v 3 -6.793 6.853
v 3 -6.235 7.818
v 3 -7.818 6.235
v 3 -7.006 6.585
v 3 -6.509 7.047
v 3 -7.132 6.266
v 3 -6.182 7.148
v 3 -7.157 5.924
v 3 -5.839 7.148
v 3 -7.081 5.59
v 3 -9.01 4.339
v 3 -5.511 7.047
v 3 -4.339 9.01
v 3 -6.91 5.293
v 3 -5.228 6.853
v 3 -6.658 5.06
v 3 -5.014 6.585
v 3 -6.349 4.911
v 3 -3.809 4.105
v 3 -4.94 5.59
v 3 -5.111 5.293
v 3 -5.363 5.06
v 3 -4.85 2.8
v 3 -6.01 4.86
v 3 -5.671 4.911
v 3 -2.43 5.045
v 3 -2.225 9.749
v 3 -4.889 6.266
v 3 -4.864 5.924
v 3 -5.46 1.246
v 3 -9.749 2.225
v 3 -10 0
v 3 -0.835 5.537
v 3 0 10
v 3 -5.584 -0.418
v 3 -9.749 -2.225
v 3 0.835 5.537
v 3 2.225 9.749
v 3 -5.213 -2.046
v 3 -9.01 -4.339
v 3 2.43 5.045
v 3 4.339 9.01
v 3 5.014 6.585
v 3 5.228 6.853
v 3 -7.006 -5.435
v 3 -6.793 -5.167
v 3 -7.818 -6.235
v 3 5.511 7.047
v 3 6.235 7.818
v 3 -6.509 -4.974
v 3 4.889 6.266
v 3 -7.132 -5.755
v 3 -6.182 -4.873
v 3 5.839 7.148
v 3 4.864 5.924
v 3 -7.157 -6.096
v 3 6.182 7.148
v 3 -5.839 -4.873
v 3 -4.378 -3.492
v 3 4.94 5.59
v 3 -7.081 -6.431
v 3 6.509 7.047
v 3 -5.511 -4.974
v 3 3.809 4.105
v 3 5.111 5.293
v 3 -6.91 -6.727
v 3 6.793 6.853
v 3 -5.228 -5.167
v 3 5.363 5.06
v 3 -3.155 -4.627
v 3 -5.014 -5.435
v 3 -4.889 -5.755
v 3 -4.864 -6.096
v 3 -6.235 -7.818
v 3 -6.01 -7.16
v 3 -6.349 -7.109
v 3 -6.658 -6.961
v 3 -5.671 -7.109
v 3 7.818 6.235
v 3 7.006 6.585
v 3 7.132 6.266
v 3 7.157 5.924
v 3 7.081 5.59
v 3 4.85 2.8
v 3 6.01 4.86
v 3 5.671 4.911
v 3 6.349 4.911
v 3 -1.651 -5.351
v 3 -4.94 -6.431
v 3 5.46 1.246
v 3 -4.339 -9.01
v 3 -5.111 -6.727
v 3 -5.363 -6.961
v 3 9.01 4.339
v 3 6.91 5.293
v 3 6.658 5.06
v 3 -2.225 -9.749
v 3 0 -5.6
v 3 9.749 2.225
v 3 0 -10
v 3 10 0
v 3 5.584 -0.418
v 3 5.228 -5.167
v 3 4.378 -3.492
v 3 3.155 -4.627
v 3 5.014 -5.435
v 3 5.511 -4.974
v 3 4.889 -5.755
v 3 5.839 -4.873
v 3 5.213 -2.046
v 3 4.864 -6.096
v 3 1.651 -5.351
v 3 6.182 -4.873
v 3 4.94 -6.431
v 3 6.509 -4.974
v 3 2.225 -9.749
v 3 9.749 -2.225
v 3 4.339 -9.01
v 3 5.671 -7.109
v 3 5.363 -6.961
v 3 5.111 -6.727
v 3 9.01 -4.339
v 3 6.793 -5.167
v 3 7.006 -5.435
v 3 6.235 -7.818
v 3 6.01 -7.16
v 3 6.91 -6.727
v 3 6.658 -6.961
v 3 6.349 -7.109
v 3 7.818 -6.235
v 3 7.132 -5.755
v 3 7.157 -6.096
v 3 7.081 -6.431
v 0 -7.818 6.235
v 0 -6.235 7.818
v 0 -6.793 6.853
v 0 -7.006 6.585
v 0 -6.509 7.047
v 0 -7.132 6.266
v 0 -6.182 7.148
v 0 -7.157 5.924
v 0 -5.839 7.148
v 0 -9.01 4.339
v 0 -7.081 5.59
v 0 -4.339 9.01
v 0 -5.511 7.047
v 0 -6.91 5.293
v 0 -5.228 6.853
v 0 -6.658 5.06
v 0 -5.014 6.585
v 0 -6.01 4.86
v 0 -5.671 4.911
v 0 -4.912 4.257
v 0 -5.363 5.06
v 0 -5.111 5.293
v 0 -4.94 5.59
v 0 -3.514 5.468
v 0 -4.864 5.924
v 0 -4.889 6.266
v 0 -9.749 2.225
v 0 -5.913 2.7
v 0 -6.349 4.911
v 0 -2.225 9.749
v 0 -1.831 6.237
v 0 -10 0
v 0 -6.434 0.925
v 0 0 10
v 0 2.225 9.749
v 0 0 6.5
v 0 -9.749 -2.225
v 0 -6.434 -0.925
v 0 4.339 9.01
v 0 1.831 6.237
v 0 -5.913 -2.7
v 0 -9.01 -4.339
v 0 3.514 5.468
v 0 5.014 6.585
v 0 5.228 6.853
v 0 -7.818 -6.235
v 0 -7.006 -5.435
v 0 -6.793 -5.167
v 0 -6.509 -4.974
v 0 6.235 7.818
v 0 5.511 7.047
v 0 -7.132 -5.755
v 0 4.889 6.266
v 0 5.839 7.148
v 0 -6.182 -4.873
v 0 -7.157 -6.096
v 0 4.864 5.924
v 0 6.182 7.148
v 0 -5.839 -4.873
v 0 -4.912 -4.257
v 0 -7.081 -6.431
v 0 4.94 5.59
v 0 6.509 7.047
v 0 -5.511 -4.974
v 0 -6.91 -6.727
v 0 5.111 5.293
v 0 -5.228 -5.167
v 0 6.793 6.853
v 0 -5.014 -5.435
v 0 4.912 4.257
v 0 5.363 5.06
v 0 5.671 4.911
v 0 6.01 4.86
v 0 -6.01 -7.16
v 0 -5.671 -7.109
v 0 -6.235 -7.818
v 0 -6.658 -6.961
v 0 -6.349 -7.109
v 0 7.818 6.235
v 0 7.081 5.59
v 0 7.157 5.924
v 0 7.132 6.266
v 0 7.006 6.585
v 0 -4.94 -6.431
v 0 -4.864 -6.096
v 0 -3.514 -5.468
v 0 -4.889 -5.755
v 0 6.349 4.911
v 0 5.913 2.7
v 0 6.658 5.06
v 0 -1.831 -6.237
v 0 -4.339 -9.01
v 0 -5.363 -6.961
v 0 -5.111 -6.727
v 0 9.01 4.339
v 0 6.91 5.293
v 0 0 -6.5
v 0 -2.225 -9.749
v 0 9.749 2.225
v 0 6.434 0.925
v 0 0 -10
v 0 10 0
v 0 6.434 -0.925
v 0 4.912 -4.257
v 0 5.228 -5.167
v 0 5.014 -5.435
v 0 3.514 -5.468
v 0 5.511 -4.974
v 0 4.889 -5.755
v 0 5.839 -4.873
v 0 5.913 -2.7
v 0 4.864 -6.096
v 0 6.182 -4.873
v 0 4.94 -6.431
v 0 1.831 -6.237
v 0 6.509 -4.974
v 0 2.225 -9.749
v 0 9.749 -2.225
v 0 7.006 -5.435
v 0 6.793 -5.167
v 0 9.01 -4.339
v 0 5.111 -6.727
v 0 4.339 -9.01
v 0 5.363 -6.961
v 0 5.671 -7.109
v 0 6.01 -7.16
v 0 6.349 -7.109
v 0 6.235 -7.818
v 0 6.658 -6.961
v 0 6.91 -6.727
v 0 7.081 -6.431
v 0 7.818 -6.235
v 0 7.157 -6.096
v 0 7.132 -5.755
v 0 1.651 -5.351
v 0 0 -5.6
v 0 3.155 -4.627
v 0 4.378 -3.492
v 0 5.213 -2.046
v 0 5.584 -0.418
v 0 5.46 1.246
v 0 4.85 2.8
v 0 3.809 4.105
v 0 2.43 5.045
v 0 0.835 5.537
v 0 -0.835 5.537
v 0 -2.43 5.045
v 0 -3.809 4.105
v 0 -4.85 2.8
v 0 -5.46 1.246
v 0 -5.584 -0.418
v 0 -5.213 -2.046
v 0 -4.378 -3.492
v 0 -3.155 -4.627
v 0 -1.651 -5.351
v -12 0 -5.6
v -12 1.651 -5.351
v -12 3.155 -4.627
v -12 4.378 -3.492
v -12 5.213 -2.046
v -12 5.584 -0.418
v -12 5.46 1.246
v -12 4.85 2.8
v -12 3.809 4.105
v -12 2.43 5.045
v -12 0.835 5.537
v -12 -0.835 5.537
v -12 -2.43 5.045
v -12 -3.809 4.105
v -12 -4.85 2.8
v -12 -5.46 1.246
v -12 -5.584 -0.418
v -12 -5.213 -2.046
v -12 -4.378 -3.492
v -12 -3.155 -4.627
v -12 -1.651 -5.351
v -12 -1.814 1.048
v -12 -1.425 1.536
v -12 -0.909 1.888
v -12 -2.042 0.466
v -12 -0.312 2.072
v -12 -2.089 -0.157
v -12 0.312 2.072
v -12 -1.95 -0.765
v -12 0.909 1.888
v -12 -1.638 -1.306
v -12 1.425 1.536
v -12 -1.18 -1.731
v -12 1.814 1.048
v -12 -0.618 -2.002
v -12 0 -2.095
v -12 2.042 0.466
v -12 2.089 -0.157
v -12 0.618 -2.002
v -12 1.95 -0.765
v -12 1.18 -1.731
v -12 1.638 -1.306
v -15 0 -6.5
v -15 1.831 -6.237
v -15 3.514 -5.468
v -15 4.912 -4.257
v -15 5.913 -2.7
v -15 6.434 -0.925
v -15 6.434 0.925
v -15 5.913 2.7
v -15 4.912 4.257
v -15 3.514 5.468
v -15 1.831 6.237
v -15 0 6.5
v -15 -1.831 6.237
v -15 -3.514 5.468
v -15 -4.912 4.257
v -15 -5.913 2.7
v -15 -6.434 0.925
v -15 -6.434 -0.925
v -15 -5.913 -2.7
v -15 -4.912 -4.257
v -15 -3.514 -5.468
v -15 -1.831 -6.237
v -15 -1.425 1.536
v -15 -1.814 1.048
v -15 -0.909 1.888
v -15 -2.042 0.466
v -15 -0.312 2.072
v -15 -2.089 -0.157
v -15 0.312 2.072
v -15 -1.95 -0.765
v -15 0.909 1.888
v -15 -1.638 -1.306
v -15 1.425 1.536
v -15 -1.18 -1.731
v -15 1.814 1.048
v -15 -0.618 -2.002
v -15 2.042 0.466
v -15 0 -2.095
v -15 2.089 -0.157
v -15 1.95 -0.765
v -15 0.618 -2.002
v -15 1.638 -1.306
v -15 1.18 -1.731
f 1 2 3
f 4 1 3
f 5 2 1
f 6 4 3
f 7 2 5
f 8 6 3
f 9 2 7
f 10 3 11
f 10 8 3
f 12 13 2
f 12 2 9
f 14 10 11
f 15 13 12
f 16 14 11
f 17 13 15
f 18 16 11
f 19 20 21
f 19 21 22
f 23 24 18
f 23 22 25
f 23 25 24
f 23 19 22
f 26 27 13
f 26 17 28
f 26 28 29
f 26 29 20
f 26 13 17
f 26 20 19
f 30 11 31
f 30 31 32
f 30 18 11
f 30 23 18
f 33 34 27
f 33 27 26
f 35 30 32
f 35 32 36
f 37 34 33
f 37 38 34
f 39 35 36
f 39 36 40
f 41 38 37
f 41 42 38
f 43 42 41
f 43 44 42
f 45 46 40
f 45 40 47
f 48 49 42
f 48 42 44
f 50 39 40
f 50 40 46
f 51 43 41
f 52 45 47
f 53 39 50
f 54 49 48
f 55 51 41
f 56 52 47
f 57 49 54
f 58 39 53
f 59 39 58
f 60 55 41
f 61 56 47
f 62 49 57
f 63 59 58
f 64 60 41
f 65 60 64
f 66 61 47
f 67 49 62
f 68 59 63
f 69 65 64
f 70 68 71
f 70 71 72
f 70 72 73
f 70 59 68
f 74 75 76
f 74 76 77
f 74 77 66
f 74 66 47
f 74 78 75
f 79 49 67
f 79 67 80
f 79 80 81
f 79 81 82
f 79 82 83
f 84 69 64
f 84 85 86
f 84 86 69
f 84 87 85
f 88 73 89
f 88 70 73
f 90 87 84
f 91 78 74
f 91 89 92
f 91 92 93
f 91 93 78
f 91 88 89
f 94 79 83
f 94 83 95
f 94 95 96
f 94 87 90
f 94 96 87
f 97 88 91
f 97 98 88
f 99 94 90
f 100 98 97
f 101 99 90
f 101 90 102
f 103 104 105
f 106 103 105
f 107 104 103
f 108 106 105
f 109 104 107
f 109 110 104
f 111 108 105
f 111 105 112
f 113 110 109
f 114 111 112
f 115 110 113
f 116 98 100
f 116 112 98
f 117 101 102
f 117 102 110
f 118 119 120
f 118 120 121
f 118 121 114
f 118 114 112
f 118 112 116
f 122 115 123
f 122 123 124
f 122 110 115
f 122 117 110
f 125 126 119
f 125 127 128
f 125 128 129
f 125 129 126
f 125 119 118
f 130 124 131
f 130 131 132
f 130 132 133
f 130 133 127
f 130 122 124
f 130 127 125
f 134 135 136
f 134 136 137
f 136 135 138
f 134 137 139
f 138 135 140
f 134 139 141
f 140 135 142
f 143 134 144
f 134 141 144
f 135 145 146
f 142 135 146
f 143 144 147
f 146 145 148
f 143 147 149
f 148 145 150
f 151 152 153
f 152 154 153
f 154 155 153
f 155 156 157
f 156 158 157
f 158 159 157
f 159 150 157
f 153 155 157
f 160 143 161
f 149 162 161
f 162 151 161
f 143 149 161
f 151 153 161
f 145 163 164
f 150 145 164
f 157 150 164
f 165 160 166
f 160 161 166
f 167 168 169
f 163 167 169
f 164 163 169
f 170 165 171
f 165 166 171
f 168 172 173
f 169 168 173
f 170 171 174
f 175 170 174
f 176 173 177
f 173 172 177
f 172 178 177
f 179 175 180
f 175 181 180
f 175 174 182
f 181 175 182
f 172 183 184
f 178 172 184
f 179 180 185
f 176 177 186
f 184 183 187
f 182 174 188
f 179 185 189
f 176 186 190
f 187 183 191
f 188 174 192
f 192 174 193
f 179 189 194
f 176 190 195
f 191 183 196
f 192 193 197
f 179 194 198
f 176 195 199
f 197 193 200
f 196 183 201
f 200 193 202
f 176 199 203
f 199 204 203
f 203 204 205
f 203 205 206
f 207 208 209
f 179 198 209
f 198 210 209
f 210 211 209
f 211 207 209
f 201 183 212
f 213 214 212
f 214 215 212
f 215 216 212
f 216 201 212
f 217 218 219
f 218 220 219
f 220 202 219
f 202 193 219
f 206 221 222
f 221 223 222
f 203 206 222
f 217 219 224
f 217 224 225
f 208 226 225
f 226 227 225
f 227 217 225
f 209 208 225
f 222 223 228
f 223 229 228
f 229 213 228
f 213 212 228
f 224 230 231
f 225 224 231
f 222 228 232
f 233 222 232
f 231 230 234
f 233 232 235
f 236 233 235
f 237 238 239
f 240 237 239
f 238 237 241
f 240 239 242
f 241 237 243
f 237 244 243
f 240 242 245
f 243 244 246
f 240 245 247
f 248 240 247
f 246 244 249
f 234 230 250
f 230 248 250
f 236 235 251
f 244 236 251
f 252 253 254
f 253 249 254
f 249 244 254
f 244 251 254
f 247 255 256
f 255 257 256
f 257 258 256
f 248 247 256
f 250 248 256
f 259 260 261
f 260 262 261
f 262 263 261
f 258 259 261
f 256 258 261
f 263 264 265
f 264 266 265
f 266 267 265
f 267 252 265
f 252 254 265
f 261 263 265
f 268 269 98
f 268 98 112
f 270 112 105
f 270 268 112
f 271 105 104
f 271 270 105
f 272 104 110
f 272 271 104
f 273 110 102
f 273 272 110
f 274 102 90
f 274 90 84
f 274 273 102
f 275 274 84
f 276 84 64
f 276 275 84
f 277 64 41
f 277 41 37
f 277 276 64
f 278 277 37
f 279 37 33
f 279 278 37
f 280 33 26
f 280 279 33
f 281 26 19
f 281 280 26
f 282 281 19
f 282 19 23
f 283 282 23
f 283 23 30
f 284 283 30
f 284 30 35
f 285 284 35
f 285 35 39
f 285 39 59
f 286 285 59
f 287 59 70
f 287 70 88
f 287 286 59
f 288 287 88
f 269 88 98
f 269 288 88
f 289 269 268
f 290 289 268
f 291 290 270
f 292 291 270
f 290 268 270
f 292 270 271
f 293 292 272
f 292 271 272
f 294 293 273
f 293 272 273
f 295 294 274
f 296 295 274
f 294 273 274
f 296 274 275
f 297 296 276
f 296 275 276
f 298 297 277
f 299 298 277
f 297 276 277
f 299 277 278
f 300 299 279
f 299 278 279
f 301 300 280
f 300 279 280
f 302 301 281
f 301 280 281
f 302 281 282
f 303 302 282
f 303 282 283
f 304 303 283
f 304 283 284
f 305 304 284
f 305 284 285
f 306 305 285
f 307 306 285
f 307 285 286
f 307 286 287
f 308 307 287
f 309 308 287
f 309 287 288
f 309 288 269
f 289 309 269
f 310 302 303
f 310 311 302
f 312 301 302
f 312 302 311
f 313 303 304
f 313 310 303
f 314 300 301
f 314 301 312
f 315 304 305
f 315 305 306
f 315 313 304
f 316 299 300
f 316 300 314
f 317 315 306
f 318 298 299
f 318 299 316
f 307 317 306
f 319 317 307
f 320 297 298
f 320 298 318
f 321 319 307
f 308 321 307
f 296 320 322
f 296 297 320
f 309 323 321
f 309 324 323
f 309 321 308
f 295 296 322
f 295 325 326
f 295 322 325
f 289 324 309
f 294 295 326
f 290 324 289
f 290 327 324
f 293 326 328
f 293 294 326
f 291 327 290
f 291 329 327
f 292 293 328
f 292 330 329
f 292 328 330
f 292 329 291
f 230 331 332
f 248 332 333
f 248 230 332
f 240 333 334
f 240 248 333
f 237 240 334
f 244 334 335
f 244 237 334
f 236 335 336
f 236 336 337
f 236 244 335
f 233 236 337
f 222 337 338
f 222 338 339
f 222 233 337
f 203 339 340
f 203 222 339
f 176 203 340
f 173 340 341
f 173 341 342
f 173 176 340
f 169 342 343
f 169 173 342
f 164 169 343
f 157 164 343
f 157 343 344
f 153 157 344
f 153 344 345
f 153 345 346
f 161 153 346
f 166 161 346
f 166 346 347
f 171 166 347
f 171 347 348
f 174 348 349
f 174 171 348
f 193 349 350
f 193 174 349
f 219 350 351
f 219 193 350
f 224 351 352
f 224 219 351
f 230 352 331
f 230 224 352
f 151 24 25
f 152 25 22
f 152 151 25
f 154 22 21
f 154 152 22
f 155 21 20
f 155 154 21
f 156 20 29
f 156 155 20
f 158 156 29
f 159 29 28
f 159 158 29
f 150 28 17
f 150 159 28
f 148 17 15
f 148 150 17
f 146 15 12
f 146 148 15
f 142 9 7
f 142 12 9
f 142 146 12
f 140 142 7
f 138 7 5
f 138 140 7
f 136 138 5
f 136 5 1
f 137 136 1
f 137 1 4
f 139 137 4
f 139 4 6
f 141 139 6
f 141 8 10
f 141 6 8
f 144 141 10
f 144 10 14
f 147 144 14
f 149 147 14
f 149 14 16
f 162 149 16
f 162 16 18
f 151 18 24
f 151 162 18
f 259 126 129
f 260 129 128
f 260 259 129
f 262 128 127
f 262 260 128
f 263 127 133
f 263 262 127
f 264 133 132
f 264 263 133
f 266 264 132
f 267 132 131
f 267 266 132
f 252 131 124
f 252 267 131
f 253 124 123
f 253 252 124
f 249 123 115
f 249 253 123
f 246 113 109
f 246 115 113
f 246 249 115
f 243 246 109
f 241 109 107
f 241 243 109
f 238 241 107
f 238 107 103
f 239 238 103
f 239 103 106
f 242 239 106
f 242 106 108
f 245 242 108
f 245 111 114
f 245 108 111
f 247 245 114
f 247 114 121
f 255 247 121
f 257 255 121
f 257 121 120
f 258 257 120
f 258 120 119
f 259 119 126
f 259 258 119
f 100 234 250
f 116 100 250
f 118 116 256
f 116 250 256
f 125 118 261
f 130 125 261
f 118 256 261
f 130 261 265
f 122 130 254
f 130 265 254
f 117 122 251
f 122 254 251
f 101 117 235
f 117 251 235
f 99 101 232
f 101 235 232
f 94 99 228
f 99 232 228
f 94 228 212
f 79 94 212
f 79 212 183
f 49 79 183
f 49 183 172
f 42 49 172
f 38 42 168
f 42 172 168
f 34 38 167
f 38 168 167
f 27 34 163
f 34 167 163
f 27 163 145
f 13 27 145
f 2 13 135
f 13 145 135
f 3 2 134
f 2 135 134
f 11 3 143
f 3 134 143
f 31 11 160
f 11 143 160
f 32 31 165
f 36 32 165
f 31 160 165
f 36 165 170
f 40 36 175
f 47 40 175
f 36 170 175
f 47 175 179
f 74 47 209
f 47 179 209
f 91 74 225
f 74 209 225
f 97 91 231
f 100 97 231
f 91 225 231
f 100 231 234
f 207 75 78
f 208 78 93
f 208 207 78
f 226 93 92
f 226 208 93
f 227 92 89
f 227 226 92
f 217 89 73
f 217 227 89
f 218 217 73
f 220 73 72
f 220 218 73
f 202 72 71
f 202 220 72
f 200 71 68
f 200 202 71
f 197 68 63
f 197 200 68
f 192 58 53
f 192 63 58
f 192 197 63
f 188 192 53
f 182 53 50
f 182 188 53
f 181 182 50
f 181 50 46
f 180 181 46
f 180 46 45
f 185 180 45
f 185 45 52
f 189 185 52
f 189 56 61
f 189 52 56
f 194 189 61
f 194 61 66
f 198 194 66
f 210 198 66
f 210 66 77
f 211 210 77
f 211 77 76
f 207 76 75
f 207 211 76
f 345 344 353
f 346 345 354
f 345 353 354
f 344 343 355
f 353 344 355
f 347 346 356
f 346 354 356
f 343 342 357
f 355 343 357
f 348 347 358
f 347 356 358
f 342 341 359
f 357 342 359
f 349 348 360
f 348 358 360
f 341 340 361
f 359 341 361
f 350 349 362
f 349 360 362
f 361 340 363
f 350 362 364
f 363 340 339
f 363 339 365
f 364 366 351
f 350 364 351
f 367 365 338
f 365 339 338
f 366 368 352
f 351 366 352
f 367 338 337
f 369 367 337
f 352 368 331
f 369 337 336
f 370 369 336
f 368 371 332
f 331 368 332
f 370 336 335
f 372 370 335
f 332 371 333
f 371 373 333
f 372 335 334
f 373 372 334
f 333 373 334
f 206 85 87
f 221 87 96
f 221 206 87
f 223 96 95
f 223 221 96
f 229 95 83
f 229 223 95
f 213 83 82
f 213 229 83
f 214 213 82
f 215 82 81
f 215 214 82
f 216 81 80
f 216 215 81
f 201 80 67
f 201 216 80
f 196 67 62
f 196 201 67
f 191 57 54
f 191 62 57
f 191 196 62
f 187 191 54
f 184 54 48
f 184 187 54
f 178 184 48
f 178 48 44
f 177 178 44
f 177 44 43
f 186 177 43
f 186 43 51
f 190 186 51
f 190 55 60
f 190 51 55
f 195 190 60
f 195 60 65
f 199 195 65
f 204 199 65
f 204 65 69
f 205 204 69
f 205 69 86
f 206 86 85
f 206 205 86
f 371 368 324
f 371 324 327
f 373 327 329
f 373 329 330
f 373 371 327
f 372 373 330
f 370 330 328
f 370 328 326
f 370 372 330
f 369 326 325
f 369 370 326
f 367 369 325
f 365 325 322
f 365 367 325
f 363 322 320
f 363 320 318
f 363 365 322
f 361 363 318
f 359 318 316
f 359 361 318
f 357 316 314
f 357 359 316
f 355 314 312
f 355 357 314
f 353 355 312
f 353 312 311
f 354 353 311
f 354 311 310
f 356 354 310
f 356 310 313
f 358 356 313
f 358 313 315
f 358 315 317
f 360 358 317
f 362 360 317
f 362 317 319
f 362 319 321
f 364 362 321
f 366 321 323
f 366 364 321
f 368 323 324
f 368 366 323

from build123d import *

# Parameters (mm, degrees)
SKETCH2_R           = 10
BOSS_EXTRUDE1_DEPTH = 3
SKETCH3_R           = 6.5
SKETCH3_R_2         = 5.6
BOSS_EXTRUDE2_DEPTH = 15
BOSS_EXTRUDE3_START = -15
SKETCH4_R           = 6.5
SKETCH4_R_2         = 2.095
BOSS_EXTRUDE3_DEPTH = 3
SKETCH5_R           = 5.6
CUT_EXTRUDE1_DEPTH  = 3
SKETCH6_R           = 1.15
CUT_EXTRUDE2_DEPTH  = 4


with BuildPart() as part:
    # Sketch2 → Boss-Extrude1 (new body)
    with BuildSketch(Plane(origin=(0, 0, 0), x_dir=(0, 0, -1), z_dir=(1, 0, 0))):
        Circle(SKETCH2_R)
    extrude(amount=BOSS_EXTRUDE1_DEPTH)

    # Sketch3 → Boss-Extrude2 (add)
    with BuildSketch(Plane(origin=(0, 0, 0), x_dir=(0, 0, -1), z_dir=(1, 0, 0))):
        Circle(SKETCH3_R)
        Circle(SKETCH3_R_2, mode=Mode.SUBTRACT)
    extrude(amount=-BOSS_EXTRUDE2_DEPTH)

    # Sketch4 → Boss-Extrude3 (add)
    with BuildSketch(Plane(origin=(0, 0, 0), x_dir=(0, 0, -1), z_dir=(1, 0, 0)).offset(BOSS_EXTRUDE3_START)):
        Circle(SKETCH4_R)
        Circle(SKETCH4_R_2, mode=Mode.SUBTRACT)
    extrude(amount=BOSS_EXTRUDE3_DEPTH)

    # Sketch5 → Cut-Extrude1 (cut)
    with BuildSketch(Plane(origin=(0, 0, 0), x_dir=(0, 0, -1), z_dir=(1, 0, 0))):
        Circle(SKETCH5_R)
    extrude(amount=CUT_EXTRUDE1_DEPTH, mode=Mode.SUBTRACT)

    # Sketch6 → Cut-Extrude2 (cut, through all)
    with BuildSketch(Plane(origin=(0, 0, 0), x_dir=(0, 0, -1), z_dir=(1, 0, 0))):
        with Locations((6.01040764, 6.01040764)):
            Circle(SKETCH6_R)
        with Locations((6.01040764, -6.01040764)):
            Circle(SKETCH6_R)
        with Locations((-6.01040764, -6.01040764)):
            Circle(SKETCH6_R)
        with Locations((-6.01040764, 6.01040764)):
            Circle(SKETCH6_R)
    extrude(amount=CUT_EXTRUDE2_DEPTH, mode=Mode.SUBTRACT)


solid = part.part
